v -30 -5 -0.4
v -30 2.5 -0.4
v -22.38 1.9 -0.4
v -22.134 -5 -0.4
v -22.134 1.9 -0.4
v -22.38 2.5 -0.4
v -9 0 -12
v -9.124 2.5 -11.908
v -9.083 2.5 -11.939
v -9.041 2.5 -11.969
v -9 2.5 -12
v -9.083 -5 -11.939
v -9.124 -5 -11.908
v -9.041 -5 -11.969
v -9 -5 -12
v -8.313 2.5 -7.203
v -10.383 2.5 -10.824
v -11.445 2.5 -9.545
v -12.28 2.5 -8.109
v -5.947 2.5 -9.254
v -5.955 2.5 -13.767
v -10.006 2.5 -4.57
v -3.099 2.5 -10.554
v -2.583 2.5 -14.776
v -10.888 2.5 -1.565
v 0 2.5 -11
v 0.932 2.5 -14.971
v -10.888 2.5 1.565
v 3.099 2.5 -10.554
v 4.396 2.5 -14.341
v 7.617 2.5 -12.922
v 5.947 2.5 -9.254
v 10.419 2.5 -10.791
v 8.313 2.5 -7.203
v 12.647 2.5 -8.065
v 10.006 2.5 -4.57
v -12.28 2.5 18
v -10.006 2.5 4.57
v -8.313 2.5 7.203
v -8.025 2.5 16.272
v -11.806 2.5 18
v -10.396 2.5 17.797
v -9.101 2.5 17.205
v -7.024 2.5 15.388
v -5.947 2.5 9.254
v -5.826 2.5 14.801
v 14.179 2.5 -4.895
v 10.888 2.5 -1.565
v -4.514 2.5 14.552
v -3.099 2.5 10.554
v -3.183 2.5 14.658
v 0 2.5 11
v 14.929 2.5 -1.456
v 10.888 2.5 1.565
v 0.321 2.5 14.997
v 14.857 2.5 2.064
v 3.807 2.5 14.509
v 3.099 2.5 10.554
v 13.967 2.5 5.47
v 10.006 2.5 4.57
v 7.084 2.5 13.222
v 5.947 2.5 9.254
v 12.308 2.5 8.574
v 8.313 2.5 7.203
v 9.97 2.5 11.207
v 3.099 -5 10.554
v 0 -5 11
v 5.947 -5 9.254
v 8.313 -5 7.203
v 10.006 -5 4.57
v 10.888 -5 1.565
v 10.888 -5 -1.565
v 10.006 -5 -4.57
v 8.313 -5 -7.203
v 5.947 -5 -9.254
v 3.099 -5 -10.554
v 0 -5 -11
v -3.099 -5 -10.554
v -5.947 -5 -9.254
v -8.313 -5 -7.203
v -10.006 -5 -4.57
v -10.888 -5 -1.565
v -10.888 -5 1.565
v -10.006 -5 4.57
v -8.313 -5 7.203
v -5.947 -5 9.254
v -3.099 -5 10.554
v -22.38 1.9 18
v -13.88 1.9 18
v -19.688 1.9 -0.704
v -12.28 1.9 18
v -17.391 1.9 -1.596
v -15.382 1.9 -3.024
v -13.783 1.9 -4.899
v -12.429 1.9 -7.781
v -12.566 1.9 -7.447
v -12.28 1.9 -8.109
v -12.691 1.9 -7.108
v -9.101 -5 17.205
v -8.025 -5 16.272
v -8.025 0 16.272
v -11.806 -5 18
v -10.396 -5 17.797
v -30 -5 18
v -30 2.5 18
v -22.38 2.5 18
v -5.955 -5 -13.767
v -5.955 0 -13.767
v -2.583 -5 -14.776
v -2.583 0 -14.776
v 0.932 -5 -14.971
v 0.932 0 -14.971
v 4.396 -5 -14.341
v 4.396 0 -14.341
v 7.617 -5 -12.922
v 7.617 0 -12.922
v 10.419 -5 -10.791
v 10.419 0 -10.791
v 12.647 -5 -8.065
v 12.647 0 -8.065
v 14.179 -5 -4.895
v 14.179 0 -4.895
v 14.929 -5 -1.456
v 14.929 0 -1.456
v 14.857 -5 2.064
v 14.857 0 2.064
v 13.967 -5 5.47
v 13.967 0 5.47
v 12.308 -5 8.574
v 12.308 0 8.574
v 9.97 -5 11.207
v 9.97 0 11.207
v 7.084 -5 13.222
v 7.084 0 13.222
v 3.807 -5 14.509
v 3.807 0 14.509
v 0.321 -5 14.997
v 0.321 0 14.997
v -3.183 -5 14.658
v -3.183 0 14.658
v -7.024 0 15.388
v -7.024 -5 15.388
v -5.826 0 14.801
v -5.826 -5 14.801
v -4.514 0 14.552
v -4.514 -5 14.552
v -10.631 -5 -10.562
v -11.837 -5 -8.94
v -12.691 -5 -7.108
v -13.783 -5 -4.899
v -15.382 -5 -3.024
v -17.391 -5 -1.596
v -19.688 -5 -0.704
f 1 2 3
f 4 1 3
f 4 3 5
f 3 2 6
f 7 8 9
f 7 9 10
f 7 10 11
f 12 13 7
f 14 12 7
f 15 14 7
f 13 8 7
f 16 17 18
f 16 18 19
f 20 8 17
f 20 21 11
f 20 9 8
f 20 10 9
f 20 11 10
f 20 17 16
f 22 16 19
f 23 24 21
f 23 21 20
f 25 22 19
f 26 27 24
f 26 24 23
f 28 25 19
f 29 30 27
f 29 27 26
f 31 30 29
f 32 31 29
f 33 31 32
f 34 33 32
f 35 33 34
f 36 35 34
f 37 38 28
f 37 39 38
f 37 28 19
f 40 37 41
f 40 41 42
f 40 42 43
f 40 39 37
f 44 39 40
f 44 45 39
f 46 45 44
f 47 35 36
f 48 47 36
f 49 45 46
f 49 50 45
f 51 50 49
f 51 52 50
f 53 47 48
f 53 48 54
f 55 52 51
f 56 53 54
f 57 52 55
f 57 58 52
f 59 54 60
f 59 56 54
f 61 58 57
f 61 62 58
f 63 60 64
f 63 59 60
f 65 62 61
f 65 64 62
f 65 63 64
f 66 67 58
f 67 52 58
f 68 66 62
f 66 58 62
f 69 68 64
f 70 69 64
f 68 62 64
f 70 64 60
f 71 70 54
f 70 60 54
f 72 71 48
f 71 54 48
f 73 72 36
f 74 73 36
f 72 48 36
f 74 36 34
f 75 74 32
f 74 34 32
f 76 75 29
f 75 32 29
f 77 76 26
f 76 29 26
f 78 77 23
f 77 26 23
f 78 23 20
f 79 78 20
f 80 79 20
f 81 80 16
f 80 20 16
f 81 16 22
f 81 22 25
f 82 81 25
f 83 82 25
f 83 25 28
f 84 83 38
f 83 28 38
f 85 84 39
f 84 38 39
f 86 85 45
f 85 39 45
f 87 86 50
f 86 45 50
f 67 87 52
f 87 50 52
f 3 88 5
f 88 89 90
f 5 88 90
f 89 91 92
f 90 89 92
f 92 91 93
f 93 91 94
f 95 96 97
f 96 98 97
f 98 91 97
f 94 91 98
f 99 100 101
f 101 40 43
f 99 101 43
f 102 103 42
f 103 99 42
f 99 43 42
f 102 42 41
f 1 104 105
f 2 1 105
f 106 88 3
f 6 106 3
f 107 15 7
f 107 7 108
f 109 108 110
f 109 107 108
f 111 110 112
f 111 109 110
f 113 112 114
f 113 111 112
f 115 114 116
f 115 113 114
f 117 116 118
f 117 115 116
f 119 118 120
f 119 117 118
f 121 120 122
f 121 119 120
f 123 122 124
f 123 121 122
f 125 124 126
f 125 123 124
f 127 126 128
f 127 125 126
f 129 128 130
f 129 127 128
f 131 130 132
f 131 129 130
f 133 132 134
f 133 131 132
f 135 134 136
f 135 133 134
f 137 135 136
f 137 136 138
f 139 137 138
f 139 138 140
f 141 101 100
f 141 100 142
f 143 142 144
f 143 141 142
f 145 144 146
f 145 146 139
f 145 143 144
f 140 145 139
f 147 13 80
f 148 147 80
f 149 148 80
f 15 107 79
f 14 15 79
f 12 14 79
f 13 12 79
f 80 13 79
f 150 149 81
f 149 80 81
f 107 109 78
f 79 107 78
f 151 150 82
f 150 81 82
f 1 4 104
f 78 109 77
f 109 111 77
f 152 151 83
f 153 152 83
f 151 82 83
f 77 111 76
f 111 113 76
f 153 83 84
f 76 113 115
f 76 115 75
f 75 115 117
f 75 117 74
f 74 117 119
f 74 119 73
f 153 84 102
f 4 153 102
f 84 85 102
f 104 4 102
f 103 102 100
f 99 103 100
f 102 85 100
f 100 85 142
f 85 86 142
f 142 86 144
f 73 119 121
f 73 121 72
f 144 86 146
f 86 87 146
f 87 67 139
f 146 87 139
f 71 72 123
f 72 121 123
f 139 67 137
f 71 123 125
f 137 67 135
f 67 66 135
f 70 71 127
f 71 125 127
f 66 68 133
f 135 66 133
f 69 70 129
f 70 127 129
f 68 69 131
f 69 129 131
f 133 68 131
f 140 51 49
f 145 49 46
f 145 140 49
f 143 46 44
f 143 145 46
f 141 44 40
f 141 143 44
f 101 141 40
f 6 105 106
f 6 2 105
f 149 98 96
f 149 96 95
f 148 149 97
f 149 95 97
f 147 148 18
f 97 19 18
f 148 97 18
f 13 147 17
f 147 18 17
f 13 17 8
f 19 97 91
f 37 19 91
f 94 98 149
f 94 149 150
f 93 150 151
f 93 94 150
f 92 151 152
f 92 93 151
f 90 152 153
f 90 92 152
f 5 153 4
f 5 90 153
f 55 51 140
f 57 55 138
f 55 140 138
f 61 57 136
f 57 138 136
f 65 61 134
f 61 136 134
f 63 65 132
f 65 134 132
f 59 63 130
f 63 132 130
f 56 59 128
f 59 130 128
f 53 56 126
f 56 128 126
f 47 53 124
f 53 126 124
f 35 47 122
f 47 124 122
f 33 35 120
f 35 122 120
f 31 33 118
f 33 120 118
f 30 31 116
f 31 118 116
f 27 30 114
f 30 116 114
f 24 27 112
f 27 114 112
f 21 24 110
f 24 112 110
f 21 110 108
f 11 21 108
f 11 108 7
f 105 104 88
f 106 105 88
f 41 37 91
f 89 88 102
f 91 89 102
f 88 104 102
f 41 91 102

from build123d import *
from build123d.topology import SkipClean

# Parameters (mm, degrees)
BOSS_EXTRUDE1_DEPTH = 2.5
SKETCH2_W           = 10
SKETCH2_H           = 20
CUT_EXTRUDE1_DEPTH  = 0.6
SKETCH4_R           = 11
CUT_EXTRUDE2_DEPTH  = 34.634060118
BOSS_EXTRUDE2_START = 5
SKETCH6_R           = 15
BOSS_EXTRUDE2_DEPTH = 5
SKETCH7_R           = 11
CUT_EXTRUDE3_DEPTH  = 34.911649916
SKETCH8_W           = 18.819660113
SKETCH8_H           = 20
BOSS_EXTRUDE3_DEPTH = 5
FILLET1_R           = 10
BOSS_EXTRUDE4_DEPTH = 8
SKETCH11_W          = 16.12
SKETCH11_H          = 10
CUT_EXTRUDE6_DEPTH  = 10
FILLET2_R           = 10
FILLET3_R           = 10
FILLET4_R           = 5
FILLET5_R           = 5
SKETCH12_W          = 1.6
SKETCH12_H          = 32.071627579
CUT_EXTRUDE7_DEPTH  = 0.6
SKETCH13_W          = 1.5
SKETCH13_H          = 20
BOSS_EXTRUDE5_DEPTH = 0.6
SKETCH14_W          = 17.743382102
SKETCH14_H          = 16.653616468
CUT_EXTRUDE8_DEPTH  = 36.780581326
FILLET6_R           = 10
FILLET7_R           = 10


with BuildPart() as part:
    # Sketch1 → Boss-Extrude1 (new body)
    with BuildSketch(Plane(origin=(0, 0, 0), x_dir=(1, 0, 0), z_dir=(0, 1, 0))):
        with BuildLine():
            Line((-30, -10), (-11.180339887, -10))
            ThreePointArc((-11.180339887, -10), (15, 0), (-11.180339887, 10))
            Line((-11.180339887, 10), (-30, 10))
            Line((-30, 10), (-30, -10))
        make_face()
    extrude(amount=BOSS_EXTRUDE1_DEPTH)

    # Sketch2 → Cut-Extrude1 (cut)
    with BuildSketch(Plane(origin=(0, 2.5, 0), x_dir=(1, 0, 0), z_dir=(0, 1, 0))):
        with Locations((-18.880339887, 0)):
            Rectangle(SKETCH2_W, SKETCH2_H)
    extrude(amount=-CUT_EXTRUDE1_DEPTH, mode=Mode.SUBTRACT)

    # Sketch4 → Cut-Extrude2 (cut, through all)
    with BuildSketch(Plane(origin=(0, 2.5, 0), x_dir=(1, 0, 0), z_dir=(0, 1, 0))):
        with Locations(Location((0, 0, 0), (0, 0, 270))):
            Circle(SKETCH4_R)
    extrude(amount=-CUT_EXTRUDE2_DEPTH, mode=Mode.SUBTRACT)

    # Sketch6 → Boss-Extrude2 (add)
    with SkipClean():  # the faces are left unmerged after this step: merging them gives an invalid solid
        with BuildSketch(Plane.XZ.offset(BOSS_EXTRUDE2_START)):
            with Locations(Location((0, 0, 0), (0, 0, 270))):
                Circle(SKETCH6_R)
        extrude(amount=-BOSS_EXTRUDE2_DEPTH)

    # Sketch7 → Cut-Extrude3 (cut, through all)
    with SkipClean():  # the faces are left unmerged after this step: merging them gives an invalid solid
        with BuildSketch(Plane(origin=(0, 0, 0), x_dir=(1, 0, 0), z_dir=(0, 1, 0))):
            with Locations(Location((0, 0, 0), (0, 0, 270))):
                Circle(SKETCH7_R)
        extrude(amount=-CUT_EXTRUDE3_DEPTH, mode=Mode.SUBTRACT)

    # Sketch8 → Boss-Extrude3 (add)
    with SkipClean():  # the faces are left unmerged after this step: merging them gives an invalid solid
        with BuildSketch(Plane.XZ):
            with Locations((-20.590169944, 0)):
                Rectangle(SKETCH8_W, SKETCH8_H)
        extrude(amount=BOSS_EXTRUDE3_DEPTH)

    # Fillet1
    # the kernel refuses this fillet: 10 mm, written as the material it adds along each edge
    with BuildSketch(Plane(origin=(-11.180339887, 0, -10), x_dir=(-1, 0, 0), z_dir=(0, -1, 0))) as fillet1_piece_1:
        with BuildLine():
            CenterArc((3.819660113, 10), FILLET1_R, 233.130102354, 36.869897646)
            ThreePointArc((-2.180339887, 2), (-1.040737849, 1.053889384), (0, 0))
            Line((0, 0), (3.819660113, 0))
        make_face()
    extrude(amount=5)
    with BuildSketch(Plane(origin=(-11.180339887, 0, 10), x_dir=(0.7369259589108584, 0, 0.6759734692155542), z_dir=(0, -1, 0))) as fillet1_piece_2:
        with BuildLine():
            CenterArc((3.944928001, 9.951248487), FILLET1_R, 227.470208625, 36.869897646)
            Line((-2.814806691, 2.581988897), (0, 0))
            ThreePointArc((0, 0), (1.479348, 0.07312727), (2.958696001, 0))
        make_face()
    extrude(amount=5)
    with BuildSketch(Plane(origin=(-11.180339887, 0, 10), x_dir=(0.7369259589108588, 0, 0.6759734692155539), z_dir=(0, 1, 0))) as fillet1_piece_3_section:
        with BuildLine():
            CenterArc((3.944928001, -9.951248487), FILLET1_R, 95.659893729, 36.869897646)
            Line((-2.814806691, -2.581988897), (0, 0))
            ThreePointArc((0, 0), (1.479348, -0.07312727), (2.958696001, 0))
        make_face()
    fillet1_piece_3 = extrude(amount=2.5, mode=Mode.PRIVATE)
    fillet1_piece_3 = split(fillet1_piece_3, bisect_by=Plane(origin=(-11.180339887, 1.9, 10), z_dir=(0, -1, 0)), keep=Keep.TOP, mode=Mode.PRIVATE)
    fillet1_piece_3 = split(fillet1_piece_3, bisect_by=Plane(origin=(-13.880339887, 0, 10), z_dir=(1, 0, 0)), keep=Keep.TOP, mode=Mode.PRIVATE)
    add(fillet1_piece_3)
    with BuildSketch(Plane(origin=(-11.180339887, 0, 10), x_dir=(0.7369259589108588, 0, 0.6759734692155539), z_dir=(0, 1, 0))) as fillet1_piece_4_section:
        with BuildLine():
            CenterArc((3.944928001, -9.951248487), FILLET1_R, 95.659893729, 36.869897646)
            Line((-2.814806691, -2.581988897), (0, 0))
            ThreePointArc((0, 0), (1.479348, -0.07312727), (2.958696001, 0))
        make_face()
    fillet1_piece_4 = extrude(amount=2.5, mode=Mode.PRIVATE)
    fillet1_piece_4 = split(fillet1_piece_4, bisect_by=Plane(origin=(-11.180339887, 1.9, 10), z_dir=(0, -1, 0)), keep=Keep.TOP, mode=Mode.PRIVATE)
    fillet1_piece_4 = split(fillet1_piece_4, bisect_by=Plane(origin=(-13.880339887, 0, 10), z_dir=(-1, 0, 0)), keep=Keep.TOP, mode=Mode.PRIVATE)
    add(fillet1_piece_4)
    with BuildSketch(Plane(origin=(-11.180339887, 0, 10), x_dir=(0.7369259589108588, 0, 0.6759734692155539), z_dir=(0, 1, 0))) as fillet1_piece_5_section:
        with BuildLine():
            CenterArc((3.944928001, -9.951248487), FILLET1_R, 95.659893729, 36.869897646)
            Line((-2.814806691, -2.581988897), (0, 0))
            ThreePointArc((0, 0), (1.479348, -0.07312727), (2.958696001, 0))
        make_face()
    fillet1_piece_5 = extrude(amount=2.5, mode=Mode.PRIVATE)
    fillet1_piece_5 = split(fillet1_piece_5, bisect_by=Plane(origin=(-11.180339887, 1.9, 10), z_dir=(0, 1, 0)), keep=Keep.TOP, mode=Mode.PRIVATE)
    fillet1_piece_5 = split(fillet1_piece_5, bisect_by=Plane(origin=(-13.880339887, 0, 10), z_dir=(1, 0, 0)), keep=Keep.TOP, mode=Mode.PRIVATE)
    add(fillet1_piece_5)
    with BuildSketch(Plane(origin=(-11.180339887, 0, -10), x_dir=(-1, 0, 0), z_dir=(0, 1, 0))) as fillet1_piece_6_section:
        with BuildLine():
            CenterArc((3.819660113, -10), FILLET1_R, 90, 36.869897646)
            ThreePointArc((-2.180339887, -2), (-1.040737849, -1.053889384), (0, 0))
            Line((0, 0), (3.819660113, 0))
        make_face()
    fillet1_piece_6 = extrude(amount=2.5, mode=Mode.PRIVATE)
    fillet1_piece_6 = split(fillet1_piece_6, bisect_by=Plane(origin=(-11.180339887, 1.9, -10), z_dir=(0, -1, 0)), keep=Keep.TOP, mode=Mode.PRIVATE)
    fillet1_piece_6 = split(fillet1_piece_6, bisect_by=Plane(origin=(-13.880339887, 0, -10), z_dir=(-1, 0, 0)), keep=Keep.TOP, mode=Mode.PRIVATE)
    add(fillet1_piece_6)
    with BuildSketch(Plane(origin=(-11.180339887, 0, -10), x_dir=(-1, 0, 0), z_dir=(0, 1, 0))) as fillet1_piece_7_section:
        with BuildLine():
            CenterArc((3.819660113, -10), FILLET1_R, 90, 36.869897646)
            ThreePointArc((-2.180339887, -2), (-1.040737849, -1.053889384), (0, 0))
            Line((0, 0), (3.819660113, 0))
        make_face()
    fillet1_piece_7 = extrude(amount=2.5, mode=Mode.PRIVATE)
    fillet1_piece_7 = split(fillet1_piece_7, bisect_by=Plane(origin=(-11.180339887, 1.9, -10), z_dir=(0, -1, 0)), keep=Keep.TOP, mode=Mode.PRIVATE)
    fillet1_piece_7 = split(fillet1_piece_7, bisect_by=Plane(origin=(-13.880339887, 0, -10), z_dir=(1, 0, 0)), keep=Keep.TOP, mode=Mode.PRIVATE)
    add(fillet1_piece_7)
    with BuildSketch(Plane(origin=(-11.180339887, 0, -10), x_dir=(-1, 0, 0), z_dir=(0, 1, 0))) as fillet1_piece_8_section:
        with BuildLine():
            CenterArc((3.819660113, -10), FILLET1_R, 90, 36.869897646)
            ThreePointArc((-2.180339887, -2), (-1.040737849, -1.053889384), (0, 0))
            Line((0, 0), (3.819660113, 0))
        make_face()
    fillet1_piece_8 = extrude(amount=2.5, mode=Mode.PRIVATE)
    fillet1_piece_8 = split(fillet1_piece_8, bisect_by=Plane(origin=(-11.180339887, 1.9, -10), z_dir=(0, 1, 0)), keep=Keep.TOP, mode=Mode.PRIVATE)
    fillet1_piece_8 = split(fillet1_piece_8, bisect_by=Plane(origin=(-13.880339887, 0, -10), z_dir=(1, 0, 0)), keep=Keep.TOP, mode=Mode.PRIVATE)
    add(fillet1_piece_8)

    # Sketch10 → Boss-Extrude4 (add)
    with BuildSketch(Plane.XY.offset(10)):
        Polygon((-30, -5), (-30, 2.5), (-23.880339887, 2.5), (-23.880339887, 1.9), (-13.880339887, 1.9), (-13.880339887, 2.5), (-9, 2.5), (-9, -5), align=None)
    extrude(amount=BOSS_EXTRUDE4_DEPTH)

    # Sketch11 → Cut-Extrude6 (cut, symmetric)
    with BuildSketch(Plane(origin=(0, 0, 0), x_dir=(1, 0, 0), z_dir=(0, 1, 0))):
        with Locations((-21.94, 7)):
            Rectangle(SKETCH11_W, SKETCH11_H)
    extrude(amount=CUT_EXTRUDE6_DEPTH, both=True, mode=Mode.SUBTRACT)

    # Fillet2
    fillet2_edges = [part.edges().sort_by_distance(p)[0] for p in [
        (-13.88, -1.25, -10.062917933),
    ]]
    fillet(fillet2_edges, radius=FILLET2_R)

    # Fillet3
    # the kernel refuses this fillet: 10 mm, written as the material it adds along each edge
    with BuildSketch(Plane(origin=(-13.88, -5, -2), x_dir=(0.16934009011749904, 0, -0.9855576765867116), z_dir=(0, 1, 0))) as fillet3_piece_1_section:
        with BuildLine():
            CenterArc((8.493185498, 9.622504823), FILLET3_R, 189.749452729, 64.457385312)
            Line((-1.362391268, 7.929103922), (-2.347948945, 7.759763832))
            Line((-2.347948945, 7.759763832), (-0.985557677, -0.16934009))
            Line((-0.985557677, -0.16934009), (0.16934009, -0.985557677))
            ThreePointArc((0.16934009, -0.985557677), (1.525816528, -0.752485734), (5.499366011, -0.962250482))
            Line((5.499366011, -0.962250482), (5.771531419, 0))
        make_face()
    fillet3_piece_1 = extrude(amount=27.613241747, mode=Mode.PRIVATE)
    fillet3_piece_1 = split(fillet3_piece_1, bisect_by=Plane(origin=(-13.88, 1.9, -2), z_dir=(0, -1, 0)), keep=Keep.TOP, mode=Mode.PRIVATE)
    add(fillet3_piece_1)
    with BuildSketch(Plane(origin=(-13.88, -25.113241747, -2), x_dir=(0.16934009011749904, 0, -0.9855576765867116), z_dir=(0, 1, 0))) as fillet3_piece_2_section:
        with BuildLine():
            CenterArc((8.493185498, 9.622504823), FILLET3_R, 189.749452729, 64.457385312)
            Line((-1.362391268, 7.929103922), (-2.347948945, 7.759763832))
            Line((-2.347948945, 7.759763832), (-0.985557677, -0.16934009))
            Line((-0.985557677, -0.16934009), (0.16934009, -0.985557677))
            ThreePointArc((0.16934009, -0.985557677), (1.525816528, -0.752485734), (5.499366011, -0.962250482))
            Line((5.499366011, -0.962250482), (5.771531419, 0))
        make_face()
    fillet3_piece_2 = extrude(amount=27.613241747, mode=Mode.PRIVATE)
    fillet3_piece_2 = split(fillet3_piece_2, bisect_by=Plane(origin=(-13.880339887, -25.113241747, -2), z_dir=(1, 0, 0)), keep=Keep.TOP, mode=Mode.PRIVATE)
    fillet3_piece_2 = split(fillet3_piece_2, bisect_by=Plane(origin=(-13.88, 1.9, -2), z_dir=(0, 1, 0)), keep=Keep.TOP, mode=Mode.PRIVATE)
    add(fillet3_piece_2)

    # Fillet4
    # the kernel refuses this fillet: 5 mm, written as the material it adds along each edge
    with BuildSketch(Plane(origin=(-9, 0, 12), x_dir=(0, 0, 1), z_dir=(0, -1, 0))) as fillet4_piece_1:
        with BuildLine():
            CenterArc((7.544416527, -4.75549972), FILLET4_R, 107.991946178, 84.260829523)
            Line((2.658312395, -5.81662479), (2.560590313, -5.837847292))
            ThreePointArc((2.560590313, -5.837847292), (1.551800458, -2.806559571), (-0.08, -0.06))
            Line((-0.08, -0.06), (0, 0.1))
            ThreePointArc((0, 0.1), (3, 0.1), (5.969111669, 0.095109994))
            Line((5.969111669, 0.095109994), (6, 0))
        make_face()
    extrude(amount=5)
    with BuildSketch(Plane(origin=(-9, 0, 12), x_dir=(0, 0, 1), z_dir=(0, 1, 0))) as fillet4_piece_2:
        with BuildLine():
            CenterArc((7.544416527, 4.75549972), FILLET4_R, 167.7472243, 84.260829523)
            Line((2.658312395, 5.81662479), (2.560590313, 5.837847292))
            ThreePointArc((2.560590313, 5.837847292), (1.551800458, 2.806559571), (-0.08, 0.06))
            Line((-0.08, 0.06), (0, -0.1))
            ThreePointArc((0, -0.1), (3, -0.1), (5.969111669, -0.095109994))
            Line((5.969111669, -0.095109994), (6, 0))
        make_face()
    extrude(amount=2.5)

    # Fillet5
    # the kernel refuses this fillet: 5 mm, written as the material it takes off along each edge
    with BuildSketch(Plane(origin=(-9, 9.514063374, 18), x_dir=(0.49143032961767363, 0, -0.8709168910589946), z_dir=(0, -1, 0))) as fillet5_piece_1:
        with BuildLine():
            CenterArc((2.975815065, -4.900618155), FILLET5_R, 101.442690238, 49.122673346)
            Line((-1.37876939, -2.443466507), (0, 0))
            ThreePointArc((0, 0), (0.991938355, -0.099381845), (1.98387671, 0))
        make_face()
    extrude(amount=21.528126747, mode=Mode.SUBTRACT)

    # Sketch12 → Cut-Extrude7 (cut)
    with BuildSketch(Plane(origin=(0, 2.5, 0), x_dir=(1, 0, 0), z_dir=(0, 1, 0))):
        with Locations((-13.080339887, -1.96418621)):
            Rectangle(SKETCH12_W, SKETCH12_H)
    extrude(amount=-CUT_EXTRUDE7_DEPTH, mode=Mode.SUBTRACT)

    # Sketch13 → Boss-Extrude5 (add)
    with BuildSketch(Plane(origin=(0, 1.9, 0), x_dir=(1, 0, 0), z_dir=(0, 1, 0))):
        with Locations((-23.130339887, -8)):
            Rectangle(SKETCH13_W, SKETCH13_H)
    extrude(amount=BOSS_EXTRUDE5_DEPTH)

    # Sketch14 → Cut-Extrude8 (cut, through all)
    with BuildSketch(Plane(origin=(0, 2.5, 0), x_dir=(1, 0, 0), z_dir=(0, 1, 0))):
        with Locations((-21.128308949, 8.726808234)):
            Rectangle(SKETCH14_W, SKETCH14_H)
    extrude(amount=-CUT_EXTRUDE8_DEPTH, mode=Mode.SUBTRACT)

    # Fillet6
    # the kernel refuses this fillet: 10 mm, written as the material it adds along each edge
    with BuildSketch(Plane(origin=(-12.256617898, 2.5, -0.4), x_dir=(0, 0, -1), z_dir=(0, -1, 0))) as fillet6_piece_1_section:
        with BuildLine():
            CenterArc((10, -9.877293528), FILLET6_R, 98.984966406, 81.015033594)
            Line((0, -9.877293528), (0, 0))
            Line((0, 0), (8.438246956, 0))
        make_face()
    fillet6_piece_1 = extrude(amount=7.5, mode=Mode.PRIVATE)
    fillet6_piece_1 = split(fillet6_piece_1, bisect_by=Plane(origin=(-12.280339887, 2.5, -0.4), z_dir=(1, 0, 0)), keep=Keep.TOP, mode=Mode.PRIVATE)
    add(fillet6_piece_1)
    with BuildSketch(Plane(origin=(-12.256617898, 27.193233819, -0.4), x_dir=(0, 0, -1), z_dir=(0, -1, 0))) as fillet6_piece_2_section:
        with BuildLine():
            CenterArc((10, -9.877293528), FILLET6_R, 98.984966406, 81.015033594)
            Line((0, -9.877293528), (0, 0))
            Line((0, 0), (8.438246956, 0))
        make_face()
    fillet6_piece_2 = extrude(amount=32.193233819, mode=Mode.PRIVATE)
    fillet6_piece_2 = split(fillet6_piece_2, bisect_by=Plane(origin=(-12.256617898, 1.9, -0.4), z_dir=(0, -1, 0)), keep=Keep.TOP, mode=Mode.PRIVATE)
    add(fillet6_piece_2)

    # Fillet7
    # the kernel refuses this fillet: 10 mm, written as the material it takes off along each edge
    with BuildSketch(Plane(origin=(-12.256617898, 13.465001661, -8.838246956), x_dir=(-0.24364329943227025, -7.330652331656778e-15, 0.9698649094805714), z_dir=(0, -1, 0))) as fillet7_piece_1:
        with BuildLine():
            CenterArc((2.675540731, -9.960151058), FILLET7_R, 95.11670471, 34.796493554)
            Line((-3.740722604, -2.289977342), (-4.382348937, -1.522959971))
            ThreePointArc((-4.382348937, -1.522959971), (-4.120966176, -1.295615595), (-0.325639131, 0.945494133))
            Line((-0.325639131, 0.945494133), (0.089184691, 0.996015106))
            ThreePointArc((0.089184691, 0.996015106), (0.89184691, 0.960151058), (1.69450913, 0.996015106))
            Line((1.69450913, 0.996015106), (1.783693821, 0))
        make_face()
    extrude(amount=29.430003321, mode=Mode.SUBTRACT)


solid = part.part
